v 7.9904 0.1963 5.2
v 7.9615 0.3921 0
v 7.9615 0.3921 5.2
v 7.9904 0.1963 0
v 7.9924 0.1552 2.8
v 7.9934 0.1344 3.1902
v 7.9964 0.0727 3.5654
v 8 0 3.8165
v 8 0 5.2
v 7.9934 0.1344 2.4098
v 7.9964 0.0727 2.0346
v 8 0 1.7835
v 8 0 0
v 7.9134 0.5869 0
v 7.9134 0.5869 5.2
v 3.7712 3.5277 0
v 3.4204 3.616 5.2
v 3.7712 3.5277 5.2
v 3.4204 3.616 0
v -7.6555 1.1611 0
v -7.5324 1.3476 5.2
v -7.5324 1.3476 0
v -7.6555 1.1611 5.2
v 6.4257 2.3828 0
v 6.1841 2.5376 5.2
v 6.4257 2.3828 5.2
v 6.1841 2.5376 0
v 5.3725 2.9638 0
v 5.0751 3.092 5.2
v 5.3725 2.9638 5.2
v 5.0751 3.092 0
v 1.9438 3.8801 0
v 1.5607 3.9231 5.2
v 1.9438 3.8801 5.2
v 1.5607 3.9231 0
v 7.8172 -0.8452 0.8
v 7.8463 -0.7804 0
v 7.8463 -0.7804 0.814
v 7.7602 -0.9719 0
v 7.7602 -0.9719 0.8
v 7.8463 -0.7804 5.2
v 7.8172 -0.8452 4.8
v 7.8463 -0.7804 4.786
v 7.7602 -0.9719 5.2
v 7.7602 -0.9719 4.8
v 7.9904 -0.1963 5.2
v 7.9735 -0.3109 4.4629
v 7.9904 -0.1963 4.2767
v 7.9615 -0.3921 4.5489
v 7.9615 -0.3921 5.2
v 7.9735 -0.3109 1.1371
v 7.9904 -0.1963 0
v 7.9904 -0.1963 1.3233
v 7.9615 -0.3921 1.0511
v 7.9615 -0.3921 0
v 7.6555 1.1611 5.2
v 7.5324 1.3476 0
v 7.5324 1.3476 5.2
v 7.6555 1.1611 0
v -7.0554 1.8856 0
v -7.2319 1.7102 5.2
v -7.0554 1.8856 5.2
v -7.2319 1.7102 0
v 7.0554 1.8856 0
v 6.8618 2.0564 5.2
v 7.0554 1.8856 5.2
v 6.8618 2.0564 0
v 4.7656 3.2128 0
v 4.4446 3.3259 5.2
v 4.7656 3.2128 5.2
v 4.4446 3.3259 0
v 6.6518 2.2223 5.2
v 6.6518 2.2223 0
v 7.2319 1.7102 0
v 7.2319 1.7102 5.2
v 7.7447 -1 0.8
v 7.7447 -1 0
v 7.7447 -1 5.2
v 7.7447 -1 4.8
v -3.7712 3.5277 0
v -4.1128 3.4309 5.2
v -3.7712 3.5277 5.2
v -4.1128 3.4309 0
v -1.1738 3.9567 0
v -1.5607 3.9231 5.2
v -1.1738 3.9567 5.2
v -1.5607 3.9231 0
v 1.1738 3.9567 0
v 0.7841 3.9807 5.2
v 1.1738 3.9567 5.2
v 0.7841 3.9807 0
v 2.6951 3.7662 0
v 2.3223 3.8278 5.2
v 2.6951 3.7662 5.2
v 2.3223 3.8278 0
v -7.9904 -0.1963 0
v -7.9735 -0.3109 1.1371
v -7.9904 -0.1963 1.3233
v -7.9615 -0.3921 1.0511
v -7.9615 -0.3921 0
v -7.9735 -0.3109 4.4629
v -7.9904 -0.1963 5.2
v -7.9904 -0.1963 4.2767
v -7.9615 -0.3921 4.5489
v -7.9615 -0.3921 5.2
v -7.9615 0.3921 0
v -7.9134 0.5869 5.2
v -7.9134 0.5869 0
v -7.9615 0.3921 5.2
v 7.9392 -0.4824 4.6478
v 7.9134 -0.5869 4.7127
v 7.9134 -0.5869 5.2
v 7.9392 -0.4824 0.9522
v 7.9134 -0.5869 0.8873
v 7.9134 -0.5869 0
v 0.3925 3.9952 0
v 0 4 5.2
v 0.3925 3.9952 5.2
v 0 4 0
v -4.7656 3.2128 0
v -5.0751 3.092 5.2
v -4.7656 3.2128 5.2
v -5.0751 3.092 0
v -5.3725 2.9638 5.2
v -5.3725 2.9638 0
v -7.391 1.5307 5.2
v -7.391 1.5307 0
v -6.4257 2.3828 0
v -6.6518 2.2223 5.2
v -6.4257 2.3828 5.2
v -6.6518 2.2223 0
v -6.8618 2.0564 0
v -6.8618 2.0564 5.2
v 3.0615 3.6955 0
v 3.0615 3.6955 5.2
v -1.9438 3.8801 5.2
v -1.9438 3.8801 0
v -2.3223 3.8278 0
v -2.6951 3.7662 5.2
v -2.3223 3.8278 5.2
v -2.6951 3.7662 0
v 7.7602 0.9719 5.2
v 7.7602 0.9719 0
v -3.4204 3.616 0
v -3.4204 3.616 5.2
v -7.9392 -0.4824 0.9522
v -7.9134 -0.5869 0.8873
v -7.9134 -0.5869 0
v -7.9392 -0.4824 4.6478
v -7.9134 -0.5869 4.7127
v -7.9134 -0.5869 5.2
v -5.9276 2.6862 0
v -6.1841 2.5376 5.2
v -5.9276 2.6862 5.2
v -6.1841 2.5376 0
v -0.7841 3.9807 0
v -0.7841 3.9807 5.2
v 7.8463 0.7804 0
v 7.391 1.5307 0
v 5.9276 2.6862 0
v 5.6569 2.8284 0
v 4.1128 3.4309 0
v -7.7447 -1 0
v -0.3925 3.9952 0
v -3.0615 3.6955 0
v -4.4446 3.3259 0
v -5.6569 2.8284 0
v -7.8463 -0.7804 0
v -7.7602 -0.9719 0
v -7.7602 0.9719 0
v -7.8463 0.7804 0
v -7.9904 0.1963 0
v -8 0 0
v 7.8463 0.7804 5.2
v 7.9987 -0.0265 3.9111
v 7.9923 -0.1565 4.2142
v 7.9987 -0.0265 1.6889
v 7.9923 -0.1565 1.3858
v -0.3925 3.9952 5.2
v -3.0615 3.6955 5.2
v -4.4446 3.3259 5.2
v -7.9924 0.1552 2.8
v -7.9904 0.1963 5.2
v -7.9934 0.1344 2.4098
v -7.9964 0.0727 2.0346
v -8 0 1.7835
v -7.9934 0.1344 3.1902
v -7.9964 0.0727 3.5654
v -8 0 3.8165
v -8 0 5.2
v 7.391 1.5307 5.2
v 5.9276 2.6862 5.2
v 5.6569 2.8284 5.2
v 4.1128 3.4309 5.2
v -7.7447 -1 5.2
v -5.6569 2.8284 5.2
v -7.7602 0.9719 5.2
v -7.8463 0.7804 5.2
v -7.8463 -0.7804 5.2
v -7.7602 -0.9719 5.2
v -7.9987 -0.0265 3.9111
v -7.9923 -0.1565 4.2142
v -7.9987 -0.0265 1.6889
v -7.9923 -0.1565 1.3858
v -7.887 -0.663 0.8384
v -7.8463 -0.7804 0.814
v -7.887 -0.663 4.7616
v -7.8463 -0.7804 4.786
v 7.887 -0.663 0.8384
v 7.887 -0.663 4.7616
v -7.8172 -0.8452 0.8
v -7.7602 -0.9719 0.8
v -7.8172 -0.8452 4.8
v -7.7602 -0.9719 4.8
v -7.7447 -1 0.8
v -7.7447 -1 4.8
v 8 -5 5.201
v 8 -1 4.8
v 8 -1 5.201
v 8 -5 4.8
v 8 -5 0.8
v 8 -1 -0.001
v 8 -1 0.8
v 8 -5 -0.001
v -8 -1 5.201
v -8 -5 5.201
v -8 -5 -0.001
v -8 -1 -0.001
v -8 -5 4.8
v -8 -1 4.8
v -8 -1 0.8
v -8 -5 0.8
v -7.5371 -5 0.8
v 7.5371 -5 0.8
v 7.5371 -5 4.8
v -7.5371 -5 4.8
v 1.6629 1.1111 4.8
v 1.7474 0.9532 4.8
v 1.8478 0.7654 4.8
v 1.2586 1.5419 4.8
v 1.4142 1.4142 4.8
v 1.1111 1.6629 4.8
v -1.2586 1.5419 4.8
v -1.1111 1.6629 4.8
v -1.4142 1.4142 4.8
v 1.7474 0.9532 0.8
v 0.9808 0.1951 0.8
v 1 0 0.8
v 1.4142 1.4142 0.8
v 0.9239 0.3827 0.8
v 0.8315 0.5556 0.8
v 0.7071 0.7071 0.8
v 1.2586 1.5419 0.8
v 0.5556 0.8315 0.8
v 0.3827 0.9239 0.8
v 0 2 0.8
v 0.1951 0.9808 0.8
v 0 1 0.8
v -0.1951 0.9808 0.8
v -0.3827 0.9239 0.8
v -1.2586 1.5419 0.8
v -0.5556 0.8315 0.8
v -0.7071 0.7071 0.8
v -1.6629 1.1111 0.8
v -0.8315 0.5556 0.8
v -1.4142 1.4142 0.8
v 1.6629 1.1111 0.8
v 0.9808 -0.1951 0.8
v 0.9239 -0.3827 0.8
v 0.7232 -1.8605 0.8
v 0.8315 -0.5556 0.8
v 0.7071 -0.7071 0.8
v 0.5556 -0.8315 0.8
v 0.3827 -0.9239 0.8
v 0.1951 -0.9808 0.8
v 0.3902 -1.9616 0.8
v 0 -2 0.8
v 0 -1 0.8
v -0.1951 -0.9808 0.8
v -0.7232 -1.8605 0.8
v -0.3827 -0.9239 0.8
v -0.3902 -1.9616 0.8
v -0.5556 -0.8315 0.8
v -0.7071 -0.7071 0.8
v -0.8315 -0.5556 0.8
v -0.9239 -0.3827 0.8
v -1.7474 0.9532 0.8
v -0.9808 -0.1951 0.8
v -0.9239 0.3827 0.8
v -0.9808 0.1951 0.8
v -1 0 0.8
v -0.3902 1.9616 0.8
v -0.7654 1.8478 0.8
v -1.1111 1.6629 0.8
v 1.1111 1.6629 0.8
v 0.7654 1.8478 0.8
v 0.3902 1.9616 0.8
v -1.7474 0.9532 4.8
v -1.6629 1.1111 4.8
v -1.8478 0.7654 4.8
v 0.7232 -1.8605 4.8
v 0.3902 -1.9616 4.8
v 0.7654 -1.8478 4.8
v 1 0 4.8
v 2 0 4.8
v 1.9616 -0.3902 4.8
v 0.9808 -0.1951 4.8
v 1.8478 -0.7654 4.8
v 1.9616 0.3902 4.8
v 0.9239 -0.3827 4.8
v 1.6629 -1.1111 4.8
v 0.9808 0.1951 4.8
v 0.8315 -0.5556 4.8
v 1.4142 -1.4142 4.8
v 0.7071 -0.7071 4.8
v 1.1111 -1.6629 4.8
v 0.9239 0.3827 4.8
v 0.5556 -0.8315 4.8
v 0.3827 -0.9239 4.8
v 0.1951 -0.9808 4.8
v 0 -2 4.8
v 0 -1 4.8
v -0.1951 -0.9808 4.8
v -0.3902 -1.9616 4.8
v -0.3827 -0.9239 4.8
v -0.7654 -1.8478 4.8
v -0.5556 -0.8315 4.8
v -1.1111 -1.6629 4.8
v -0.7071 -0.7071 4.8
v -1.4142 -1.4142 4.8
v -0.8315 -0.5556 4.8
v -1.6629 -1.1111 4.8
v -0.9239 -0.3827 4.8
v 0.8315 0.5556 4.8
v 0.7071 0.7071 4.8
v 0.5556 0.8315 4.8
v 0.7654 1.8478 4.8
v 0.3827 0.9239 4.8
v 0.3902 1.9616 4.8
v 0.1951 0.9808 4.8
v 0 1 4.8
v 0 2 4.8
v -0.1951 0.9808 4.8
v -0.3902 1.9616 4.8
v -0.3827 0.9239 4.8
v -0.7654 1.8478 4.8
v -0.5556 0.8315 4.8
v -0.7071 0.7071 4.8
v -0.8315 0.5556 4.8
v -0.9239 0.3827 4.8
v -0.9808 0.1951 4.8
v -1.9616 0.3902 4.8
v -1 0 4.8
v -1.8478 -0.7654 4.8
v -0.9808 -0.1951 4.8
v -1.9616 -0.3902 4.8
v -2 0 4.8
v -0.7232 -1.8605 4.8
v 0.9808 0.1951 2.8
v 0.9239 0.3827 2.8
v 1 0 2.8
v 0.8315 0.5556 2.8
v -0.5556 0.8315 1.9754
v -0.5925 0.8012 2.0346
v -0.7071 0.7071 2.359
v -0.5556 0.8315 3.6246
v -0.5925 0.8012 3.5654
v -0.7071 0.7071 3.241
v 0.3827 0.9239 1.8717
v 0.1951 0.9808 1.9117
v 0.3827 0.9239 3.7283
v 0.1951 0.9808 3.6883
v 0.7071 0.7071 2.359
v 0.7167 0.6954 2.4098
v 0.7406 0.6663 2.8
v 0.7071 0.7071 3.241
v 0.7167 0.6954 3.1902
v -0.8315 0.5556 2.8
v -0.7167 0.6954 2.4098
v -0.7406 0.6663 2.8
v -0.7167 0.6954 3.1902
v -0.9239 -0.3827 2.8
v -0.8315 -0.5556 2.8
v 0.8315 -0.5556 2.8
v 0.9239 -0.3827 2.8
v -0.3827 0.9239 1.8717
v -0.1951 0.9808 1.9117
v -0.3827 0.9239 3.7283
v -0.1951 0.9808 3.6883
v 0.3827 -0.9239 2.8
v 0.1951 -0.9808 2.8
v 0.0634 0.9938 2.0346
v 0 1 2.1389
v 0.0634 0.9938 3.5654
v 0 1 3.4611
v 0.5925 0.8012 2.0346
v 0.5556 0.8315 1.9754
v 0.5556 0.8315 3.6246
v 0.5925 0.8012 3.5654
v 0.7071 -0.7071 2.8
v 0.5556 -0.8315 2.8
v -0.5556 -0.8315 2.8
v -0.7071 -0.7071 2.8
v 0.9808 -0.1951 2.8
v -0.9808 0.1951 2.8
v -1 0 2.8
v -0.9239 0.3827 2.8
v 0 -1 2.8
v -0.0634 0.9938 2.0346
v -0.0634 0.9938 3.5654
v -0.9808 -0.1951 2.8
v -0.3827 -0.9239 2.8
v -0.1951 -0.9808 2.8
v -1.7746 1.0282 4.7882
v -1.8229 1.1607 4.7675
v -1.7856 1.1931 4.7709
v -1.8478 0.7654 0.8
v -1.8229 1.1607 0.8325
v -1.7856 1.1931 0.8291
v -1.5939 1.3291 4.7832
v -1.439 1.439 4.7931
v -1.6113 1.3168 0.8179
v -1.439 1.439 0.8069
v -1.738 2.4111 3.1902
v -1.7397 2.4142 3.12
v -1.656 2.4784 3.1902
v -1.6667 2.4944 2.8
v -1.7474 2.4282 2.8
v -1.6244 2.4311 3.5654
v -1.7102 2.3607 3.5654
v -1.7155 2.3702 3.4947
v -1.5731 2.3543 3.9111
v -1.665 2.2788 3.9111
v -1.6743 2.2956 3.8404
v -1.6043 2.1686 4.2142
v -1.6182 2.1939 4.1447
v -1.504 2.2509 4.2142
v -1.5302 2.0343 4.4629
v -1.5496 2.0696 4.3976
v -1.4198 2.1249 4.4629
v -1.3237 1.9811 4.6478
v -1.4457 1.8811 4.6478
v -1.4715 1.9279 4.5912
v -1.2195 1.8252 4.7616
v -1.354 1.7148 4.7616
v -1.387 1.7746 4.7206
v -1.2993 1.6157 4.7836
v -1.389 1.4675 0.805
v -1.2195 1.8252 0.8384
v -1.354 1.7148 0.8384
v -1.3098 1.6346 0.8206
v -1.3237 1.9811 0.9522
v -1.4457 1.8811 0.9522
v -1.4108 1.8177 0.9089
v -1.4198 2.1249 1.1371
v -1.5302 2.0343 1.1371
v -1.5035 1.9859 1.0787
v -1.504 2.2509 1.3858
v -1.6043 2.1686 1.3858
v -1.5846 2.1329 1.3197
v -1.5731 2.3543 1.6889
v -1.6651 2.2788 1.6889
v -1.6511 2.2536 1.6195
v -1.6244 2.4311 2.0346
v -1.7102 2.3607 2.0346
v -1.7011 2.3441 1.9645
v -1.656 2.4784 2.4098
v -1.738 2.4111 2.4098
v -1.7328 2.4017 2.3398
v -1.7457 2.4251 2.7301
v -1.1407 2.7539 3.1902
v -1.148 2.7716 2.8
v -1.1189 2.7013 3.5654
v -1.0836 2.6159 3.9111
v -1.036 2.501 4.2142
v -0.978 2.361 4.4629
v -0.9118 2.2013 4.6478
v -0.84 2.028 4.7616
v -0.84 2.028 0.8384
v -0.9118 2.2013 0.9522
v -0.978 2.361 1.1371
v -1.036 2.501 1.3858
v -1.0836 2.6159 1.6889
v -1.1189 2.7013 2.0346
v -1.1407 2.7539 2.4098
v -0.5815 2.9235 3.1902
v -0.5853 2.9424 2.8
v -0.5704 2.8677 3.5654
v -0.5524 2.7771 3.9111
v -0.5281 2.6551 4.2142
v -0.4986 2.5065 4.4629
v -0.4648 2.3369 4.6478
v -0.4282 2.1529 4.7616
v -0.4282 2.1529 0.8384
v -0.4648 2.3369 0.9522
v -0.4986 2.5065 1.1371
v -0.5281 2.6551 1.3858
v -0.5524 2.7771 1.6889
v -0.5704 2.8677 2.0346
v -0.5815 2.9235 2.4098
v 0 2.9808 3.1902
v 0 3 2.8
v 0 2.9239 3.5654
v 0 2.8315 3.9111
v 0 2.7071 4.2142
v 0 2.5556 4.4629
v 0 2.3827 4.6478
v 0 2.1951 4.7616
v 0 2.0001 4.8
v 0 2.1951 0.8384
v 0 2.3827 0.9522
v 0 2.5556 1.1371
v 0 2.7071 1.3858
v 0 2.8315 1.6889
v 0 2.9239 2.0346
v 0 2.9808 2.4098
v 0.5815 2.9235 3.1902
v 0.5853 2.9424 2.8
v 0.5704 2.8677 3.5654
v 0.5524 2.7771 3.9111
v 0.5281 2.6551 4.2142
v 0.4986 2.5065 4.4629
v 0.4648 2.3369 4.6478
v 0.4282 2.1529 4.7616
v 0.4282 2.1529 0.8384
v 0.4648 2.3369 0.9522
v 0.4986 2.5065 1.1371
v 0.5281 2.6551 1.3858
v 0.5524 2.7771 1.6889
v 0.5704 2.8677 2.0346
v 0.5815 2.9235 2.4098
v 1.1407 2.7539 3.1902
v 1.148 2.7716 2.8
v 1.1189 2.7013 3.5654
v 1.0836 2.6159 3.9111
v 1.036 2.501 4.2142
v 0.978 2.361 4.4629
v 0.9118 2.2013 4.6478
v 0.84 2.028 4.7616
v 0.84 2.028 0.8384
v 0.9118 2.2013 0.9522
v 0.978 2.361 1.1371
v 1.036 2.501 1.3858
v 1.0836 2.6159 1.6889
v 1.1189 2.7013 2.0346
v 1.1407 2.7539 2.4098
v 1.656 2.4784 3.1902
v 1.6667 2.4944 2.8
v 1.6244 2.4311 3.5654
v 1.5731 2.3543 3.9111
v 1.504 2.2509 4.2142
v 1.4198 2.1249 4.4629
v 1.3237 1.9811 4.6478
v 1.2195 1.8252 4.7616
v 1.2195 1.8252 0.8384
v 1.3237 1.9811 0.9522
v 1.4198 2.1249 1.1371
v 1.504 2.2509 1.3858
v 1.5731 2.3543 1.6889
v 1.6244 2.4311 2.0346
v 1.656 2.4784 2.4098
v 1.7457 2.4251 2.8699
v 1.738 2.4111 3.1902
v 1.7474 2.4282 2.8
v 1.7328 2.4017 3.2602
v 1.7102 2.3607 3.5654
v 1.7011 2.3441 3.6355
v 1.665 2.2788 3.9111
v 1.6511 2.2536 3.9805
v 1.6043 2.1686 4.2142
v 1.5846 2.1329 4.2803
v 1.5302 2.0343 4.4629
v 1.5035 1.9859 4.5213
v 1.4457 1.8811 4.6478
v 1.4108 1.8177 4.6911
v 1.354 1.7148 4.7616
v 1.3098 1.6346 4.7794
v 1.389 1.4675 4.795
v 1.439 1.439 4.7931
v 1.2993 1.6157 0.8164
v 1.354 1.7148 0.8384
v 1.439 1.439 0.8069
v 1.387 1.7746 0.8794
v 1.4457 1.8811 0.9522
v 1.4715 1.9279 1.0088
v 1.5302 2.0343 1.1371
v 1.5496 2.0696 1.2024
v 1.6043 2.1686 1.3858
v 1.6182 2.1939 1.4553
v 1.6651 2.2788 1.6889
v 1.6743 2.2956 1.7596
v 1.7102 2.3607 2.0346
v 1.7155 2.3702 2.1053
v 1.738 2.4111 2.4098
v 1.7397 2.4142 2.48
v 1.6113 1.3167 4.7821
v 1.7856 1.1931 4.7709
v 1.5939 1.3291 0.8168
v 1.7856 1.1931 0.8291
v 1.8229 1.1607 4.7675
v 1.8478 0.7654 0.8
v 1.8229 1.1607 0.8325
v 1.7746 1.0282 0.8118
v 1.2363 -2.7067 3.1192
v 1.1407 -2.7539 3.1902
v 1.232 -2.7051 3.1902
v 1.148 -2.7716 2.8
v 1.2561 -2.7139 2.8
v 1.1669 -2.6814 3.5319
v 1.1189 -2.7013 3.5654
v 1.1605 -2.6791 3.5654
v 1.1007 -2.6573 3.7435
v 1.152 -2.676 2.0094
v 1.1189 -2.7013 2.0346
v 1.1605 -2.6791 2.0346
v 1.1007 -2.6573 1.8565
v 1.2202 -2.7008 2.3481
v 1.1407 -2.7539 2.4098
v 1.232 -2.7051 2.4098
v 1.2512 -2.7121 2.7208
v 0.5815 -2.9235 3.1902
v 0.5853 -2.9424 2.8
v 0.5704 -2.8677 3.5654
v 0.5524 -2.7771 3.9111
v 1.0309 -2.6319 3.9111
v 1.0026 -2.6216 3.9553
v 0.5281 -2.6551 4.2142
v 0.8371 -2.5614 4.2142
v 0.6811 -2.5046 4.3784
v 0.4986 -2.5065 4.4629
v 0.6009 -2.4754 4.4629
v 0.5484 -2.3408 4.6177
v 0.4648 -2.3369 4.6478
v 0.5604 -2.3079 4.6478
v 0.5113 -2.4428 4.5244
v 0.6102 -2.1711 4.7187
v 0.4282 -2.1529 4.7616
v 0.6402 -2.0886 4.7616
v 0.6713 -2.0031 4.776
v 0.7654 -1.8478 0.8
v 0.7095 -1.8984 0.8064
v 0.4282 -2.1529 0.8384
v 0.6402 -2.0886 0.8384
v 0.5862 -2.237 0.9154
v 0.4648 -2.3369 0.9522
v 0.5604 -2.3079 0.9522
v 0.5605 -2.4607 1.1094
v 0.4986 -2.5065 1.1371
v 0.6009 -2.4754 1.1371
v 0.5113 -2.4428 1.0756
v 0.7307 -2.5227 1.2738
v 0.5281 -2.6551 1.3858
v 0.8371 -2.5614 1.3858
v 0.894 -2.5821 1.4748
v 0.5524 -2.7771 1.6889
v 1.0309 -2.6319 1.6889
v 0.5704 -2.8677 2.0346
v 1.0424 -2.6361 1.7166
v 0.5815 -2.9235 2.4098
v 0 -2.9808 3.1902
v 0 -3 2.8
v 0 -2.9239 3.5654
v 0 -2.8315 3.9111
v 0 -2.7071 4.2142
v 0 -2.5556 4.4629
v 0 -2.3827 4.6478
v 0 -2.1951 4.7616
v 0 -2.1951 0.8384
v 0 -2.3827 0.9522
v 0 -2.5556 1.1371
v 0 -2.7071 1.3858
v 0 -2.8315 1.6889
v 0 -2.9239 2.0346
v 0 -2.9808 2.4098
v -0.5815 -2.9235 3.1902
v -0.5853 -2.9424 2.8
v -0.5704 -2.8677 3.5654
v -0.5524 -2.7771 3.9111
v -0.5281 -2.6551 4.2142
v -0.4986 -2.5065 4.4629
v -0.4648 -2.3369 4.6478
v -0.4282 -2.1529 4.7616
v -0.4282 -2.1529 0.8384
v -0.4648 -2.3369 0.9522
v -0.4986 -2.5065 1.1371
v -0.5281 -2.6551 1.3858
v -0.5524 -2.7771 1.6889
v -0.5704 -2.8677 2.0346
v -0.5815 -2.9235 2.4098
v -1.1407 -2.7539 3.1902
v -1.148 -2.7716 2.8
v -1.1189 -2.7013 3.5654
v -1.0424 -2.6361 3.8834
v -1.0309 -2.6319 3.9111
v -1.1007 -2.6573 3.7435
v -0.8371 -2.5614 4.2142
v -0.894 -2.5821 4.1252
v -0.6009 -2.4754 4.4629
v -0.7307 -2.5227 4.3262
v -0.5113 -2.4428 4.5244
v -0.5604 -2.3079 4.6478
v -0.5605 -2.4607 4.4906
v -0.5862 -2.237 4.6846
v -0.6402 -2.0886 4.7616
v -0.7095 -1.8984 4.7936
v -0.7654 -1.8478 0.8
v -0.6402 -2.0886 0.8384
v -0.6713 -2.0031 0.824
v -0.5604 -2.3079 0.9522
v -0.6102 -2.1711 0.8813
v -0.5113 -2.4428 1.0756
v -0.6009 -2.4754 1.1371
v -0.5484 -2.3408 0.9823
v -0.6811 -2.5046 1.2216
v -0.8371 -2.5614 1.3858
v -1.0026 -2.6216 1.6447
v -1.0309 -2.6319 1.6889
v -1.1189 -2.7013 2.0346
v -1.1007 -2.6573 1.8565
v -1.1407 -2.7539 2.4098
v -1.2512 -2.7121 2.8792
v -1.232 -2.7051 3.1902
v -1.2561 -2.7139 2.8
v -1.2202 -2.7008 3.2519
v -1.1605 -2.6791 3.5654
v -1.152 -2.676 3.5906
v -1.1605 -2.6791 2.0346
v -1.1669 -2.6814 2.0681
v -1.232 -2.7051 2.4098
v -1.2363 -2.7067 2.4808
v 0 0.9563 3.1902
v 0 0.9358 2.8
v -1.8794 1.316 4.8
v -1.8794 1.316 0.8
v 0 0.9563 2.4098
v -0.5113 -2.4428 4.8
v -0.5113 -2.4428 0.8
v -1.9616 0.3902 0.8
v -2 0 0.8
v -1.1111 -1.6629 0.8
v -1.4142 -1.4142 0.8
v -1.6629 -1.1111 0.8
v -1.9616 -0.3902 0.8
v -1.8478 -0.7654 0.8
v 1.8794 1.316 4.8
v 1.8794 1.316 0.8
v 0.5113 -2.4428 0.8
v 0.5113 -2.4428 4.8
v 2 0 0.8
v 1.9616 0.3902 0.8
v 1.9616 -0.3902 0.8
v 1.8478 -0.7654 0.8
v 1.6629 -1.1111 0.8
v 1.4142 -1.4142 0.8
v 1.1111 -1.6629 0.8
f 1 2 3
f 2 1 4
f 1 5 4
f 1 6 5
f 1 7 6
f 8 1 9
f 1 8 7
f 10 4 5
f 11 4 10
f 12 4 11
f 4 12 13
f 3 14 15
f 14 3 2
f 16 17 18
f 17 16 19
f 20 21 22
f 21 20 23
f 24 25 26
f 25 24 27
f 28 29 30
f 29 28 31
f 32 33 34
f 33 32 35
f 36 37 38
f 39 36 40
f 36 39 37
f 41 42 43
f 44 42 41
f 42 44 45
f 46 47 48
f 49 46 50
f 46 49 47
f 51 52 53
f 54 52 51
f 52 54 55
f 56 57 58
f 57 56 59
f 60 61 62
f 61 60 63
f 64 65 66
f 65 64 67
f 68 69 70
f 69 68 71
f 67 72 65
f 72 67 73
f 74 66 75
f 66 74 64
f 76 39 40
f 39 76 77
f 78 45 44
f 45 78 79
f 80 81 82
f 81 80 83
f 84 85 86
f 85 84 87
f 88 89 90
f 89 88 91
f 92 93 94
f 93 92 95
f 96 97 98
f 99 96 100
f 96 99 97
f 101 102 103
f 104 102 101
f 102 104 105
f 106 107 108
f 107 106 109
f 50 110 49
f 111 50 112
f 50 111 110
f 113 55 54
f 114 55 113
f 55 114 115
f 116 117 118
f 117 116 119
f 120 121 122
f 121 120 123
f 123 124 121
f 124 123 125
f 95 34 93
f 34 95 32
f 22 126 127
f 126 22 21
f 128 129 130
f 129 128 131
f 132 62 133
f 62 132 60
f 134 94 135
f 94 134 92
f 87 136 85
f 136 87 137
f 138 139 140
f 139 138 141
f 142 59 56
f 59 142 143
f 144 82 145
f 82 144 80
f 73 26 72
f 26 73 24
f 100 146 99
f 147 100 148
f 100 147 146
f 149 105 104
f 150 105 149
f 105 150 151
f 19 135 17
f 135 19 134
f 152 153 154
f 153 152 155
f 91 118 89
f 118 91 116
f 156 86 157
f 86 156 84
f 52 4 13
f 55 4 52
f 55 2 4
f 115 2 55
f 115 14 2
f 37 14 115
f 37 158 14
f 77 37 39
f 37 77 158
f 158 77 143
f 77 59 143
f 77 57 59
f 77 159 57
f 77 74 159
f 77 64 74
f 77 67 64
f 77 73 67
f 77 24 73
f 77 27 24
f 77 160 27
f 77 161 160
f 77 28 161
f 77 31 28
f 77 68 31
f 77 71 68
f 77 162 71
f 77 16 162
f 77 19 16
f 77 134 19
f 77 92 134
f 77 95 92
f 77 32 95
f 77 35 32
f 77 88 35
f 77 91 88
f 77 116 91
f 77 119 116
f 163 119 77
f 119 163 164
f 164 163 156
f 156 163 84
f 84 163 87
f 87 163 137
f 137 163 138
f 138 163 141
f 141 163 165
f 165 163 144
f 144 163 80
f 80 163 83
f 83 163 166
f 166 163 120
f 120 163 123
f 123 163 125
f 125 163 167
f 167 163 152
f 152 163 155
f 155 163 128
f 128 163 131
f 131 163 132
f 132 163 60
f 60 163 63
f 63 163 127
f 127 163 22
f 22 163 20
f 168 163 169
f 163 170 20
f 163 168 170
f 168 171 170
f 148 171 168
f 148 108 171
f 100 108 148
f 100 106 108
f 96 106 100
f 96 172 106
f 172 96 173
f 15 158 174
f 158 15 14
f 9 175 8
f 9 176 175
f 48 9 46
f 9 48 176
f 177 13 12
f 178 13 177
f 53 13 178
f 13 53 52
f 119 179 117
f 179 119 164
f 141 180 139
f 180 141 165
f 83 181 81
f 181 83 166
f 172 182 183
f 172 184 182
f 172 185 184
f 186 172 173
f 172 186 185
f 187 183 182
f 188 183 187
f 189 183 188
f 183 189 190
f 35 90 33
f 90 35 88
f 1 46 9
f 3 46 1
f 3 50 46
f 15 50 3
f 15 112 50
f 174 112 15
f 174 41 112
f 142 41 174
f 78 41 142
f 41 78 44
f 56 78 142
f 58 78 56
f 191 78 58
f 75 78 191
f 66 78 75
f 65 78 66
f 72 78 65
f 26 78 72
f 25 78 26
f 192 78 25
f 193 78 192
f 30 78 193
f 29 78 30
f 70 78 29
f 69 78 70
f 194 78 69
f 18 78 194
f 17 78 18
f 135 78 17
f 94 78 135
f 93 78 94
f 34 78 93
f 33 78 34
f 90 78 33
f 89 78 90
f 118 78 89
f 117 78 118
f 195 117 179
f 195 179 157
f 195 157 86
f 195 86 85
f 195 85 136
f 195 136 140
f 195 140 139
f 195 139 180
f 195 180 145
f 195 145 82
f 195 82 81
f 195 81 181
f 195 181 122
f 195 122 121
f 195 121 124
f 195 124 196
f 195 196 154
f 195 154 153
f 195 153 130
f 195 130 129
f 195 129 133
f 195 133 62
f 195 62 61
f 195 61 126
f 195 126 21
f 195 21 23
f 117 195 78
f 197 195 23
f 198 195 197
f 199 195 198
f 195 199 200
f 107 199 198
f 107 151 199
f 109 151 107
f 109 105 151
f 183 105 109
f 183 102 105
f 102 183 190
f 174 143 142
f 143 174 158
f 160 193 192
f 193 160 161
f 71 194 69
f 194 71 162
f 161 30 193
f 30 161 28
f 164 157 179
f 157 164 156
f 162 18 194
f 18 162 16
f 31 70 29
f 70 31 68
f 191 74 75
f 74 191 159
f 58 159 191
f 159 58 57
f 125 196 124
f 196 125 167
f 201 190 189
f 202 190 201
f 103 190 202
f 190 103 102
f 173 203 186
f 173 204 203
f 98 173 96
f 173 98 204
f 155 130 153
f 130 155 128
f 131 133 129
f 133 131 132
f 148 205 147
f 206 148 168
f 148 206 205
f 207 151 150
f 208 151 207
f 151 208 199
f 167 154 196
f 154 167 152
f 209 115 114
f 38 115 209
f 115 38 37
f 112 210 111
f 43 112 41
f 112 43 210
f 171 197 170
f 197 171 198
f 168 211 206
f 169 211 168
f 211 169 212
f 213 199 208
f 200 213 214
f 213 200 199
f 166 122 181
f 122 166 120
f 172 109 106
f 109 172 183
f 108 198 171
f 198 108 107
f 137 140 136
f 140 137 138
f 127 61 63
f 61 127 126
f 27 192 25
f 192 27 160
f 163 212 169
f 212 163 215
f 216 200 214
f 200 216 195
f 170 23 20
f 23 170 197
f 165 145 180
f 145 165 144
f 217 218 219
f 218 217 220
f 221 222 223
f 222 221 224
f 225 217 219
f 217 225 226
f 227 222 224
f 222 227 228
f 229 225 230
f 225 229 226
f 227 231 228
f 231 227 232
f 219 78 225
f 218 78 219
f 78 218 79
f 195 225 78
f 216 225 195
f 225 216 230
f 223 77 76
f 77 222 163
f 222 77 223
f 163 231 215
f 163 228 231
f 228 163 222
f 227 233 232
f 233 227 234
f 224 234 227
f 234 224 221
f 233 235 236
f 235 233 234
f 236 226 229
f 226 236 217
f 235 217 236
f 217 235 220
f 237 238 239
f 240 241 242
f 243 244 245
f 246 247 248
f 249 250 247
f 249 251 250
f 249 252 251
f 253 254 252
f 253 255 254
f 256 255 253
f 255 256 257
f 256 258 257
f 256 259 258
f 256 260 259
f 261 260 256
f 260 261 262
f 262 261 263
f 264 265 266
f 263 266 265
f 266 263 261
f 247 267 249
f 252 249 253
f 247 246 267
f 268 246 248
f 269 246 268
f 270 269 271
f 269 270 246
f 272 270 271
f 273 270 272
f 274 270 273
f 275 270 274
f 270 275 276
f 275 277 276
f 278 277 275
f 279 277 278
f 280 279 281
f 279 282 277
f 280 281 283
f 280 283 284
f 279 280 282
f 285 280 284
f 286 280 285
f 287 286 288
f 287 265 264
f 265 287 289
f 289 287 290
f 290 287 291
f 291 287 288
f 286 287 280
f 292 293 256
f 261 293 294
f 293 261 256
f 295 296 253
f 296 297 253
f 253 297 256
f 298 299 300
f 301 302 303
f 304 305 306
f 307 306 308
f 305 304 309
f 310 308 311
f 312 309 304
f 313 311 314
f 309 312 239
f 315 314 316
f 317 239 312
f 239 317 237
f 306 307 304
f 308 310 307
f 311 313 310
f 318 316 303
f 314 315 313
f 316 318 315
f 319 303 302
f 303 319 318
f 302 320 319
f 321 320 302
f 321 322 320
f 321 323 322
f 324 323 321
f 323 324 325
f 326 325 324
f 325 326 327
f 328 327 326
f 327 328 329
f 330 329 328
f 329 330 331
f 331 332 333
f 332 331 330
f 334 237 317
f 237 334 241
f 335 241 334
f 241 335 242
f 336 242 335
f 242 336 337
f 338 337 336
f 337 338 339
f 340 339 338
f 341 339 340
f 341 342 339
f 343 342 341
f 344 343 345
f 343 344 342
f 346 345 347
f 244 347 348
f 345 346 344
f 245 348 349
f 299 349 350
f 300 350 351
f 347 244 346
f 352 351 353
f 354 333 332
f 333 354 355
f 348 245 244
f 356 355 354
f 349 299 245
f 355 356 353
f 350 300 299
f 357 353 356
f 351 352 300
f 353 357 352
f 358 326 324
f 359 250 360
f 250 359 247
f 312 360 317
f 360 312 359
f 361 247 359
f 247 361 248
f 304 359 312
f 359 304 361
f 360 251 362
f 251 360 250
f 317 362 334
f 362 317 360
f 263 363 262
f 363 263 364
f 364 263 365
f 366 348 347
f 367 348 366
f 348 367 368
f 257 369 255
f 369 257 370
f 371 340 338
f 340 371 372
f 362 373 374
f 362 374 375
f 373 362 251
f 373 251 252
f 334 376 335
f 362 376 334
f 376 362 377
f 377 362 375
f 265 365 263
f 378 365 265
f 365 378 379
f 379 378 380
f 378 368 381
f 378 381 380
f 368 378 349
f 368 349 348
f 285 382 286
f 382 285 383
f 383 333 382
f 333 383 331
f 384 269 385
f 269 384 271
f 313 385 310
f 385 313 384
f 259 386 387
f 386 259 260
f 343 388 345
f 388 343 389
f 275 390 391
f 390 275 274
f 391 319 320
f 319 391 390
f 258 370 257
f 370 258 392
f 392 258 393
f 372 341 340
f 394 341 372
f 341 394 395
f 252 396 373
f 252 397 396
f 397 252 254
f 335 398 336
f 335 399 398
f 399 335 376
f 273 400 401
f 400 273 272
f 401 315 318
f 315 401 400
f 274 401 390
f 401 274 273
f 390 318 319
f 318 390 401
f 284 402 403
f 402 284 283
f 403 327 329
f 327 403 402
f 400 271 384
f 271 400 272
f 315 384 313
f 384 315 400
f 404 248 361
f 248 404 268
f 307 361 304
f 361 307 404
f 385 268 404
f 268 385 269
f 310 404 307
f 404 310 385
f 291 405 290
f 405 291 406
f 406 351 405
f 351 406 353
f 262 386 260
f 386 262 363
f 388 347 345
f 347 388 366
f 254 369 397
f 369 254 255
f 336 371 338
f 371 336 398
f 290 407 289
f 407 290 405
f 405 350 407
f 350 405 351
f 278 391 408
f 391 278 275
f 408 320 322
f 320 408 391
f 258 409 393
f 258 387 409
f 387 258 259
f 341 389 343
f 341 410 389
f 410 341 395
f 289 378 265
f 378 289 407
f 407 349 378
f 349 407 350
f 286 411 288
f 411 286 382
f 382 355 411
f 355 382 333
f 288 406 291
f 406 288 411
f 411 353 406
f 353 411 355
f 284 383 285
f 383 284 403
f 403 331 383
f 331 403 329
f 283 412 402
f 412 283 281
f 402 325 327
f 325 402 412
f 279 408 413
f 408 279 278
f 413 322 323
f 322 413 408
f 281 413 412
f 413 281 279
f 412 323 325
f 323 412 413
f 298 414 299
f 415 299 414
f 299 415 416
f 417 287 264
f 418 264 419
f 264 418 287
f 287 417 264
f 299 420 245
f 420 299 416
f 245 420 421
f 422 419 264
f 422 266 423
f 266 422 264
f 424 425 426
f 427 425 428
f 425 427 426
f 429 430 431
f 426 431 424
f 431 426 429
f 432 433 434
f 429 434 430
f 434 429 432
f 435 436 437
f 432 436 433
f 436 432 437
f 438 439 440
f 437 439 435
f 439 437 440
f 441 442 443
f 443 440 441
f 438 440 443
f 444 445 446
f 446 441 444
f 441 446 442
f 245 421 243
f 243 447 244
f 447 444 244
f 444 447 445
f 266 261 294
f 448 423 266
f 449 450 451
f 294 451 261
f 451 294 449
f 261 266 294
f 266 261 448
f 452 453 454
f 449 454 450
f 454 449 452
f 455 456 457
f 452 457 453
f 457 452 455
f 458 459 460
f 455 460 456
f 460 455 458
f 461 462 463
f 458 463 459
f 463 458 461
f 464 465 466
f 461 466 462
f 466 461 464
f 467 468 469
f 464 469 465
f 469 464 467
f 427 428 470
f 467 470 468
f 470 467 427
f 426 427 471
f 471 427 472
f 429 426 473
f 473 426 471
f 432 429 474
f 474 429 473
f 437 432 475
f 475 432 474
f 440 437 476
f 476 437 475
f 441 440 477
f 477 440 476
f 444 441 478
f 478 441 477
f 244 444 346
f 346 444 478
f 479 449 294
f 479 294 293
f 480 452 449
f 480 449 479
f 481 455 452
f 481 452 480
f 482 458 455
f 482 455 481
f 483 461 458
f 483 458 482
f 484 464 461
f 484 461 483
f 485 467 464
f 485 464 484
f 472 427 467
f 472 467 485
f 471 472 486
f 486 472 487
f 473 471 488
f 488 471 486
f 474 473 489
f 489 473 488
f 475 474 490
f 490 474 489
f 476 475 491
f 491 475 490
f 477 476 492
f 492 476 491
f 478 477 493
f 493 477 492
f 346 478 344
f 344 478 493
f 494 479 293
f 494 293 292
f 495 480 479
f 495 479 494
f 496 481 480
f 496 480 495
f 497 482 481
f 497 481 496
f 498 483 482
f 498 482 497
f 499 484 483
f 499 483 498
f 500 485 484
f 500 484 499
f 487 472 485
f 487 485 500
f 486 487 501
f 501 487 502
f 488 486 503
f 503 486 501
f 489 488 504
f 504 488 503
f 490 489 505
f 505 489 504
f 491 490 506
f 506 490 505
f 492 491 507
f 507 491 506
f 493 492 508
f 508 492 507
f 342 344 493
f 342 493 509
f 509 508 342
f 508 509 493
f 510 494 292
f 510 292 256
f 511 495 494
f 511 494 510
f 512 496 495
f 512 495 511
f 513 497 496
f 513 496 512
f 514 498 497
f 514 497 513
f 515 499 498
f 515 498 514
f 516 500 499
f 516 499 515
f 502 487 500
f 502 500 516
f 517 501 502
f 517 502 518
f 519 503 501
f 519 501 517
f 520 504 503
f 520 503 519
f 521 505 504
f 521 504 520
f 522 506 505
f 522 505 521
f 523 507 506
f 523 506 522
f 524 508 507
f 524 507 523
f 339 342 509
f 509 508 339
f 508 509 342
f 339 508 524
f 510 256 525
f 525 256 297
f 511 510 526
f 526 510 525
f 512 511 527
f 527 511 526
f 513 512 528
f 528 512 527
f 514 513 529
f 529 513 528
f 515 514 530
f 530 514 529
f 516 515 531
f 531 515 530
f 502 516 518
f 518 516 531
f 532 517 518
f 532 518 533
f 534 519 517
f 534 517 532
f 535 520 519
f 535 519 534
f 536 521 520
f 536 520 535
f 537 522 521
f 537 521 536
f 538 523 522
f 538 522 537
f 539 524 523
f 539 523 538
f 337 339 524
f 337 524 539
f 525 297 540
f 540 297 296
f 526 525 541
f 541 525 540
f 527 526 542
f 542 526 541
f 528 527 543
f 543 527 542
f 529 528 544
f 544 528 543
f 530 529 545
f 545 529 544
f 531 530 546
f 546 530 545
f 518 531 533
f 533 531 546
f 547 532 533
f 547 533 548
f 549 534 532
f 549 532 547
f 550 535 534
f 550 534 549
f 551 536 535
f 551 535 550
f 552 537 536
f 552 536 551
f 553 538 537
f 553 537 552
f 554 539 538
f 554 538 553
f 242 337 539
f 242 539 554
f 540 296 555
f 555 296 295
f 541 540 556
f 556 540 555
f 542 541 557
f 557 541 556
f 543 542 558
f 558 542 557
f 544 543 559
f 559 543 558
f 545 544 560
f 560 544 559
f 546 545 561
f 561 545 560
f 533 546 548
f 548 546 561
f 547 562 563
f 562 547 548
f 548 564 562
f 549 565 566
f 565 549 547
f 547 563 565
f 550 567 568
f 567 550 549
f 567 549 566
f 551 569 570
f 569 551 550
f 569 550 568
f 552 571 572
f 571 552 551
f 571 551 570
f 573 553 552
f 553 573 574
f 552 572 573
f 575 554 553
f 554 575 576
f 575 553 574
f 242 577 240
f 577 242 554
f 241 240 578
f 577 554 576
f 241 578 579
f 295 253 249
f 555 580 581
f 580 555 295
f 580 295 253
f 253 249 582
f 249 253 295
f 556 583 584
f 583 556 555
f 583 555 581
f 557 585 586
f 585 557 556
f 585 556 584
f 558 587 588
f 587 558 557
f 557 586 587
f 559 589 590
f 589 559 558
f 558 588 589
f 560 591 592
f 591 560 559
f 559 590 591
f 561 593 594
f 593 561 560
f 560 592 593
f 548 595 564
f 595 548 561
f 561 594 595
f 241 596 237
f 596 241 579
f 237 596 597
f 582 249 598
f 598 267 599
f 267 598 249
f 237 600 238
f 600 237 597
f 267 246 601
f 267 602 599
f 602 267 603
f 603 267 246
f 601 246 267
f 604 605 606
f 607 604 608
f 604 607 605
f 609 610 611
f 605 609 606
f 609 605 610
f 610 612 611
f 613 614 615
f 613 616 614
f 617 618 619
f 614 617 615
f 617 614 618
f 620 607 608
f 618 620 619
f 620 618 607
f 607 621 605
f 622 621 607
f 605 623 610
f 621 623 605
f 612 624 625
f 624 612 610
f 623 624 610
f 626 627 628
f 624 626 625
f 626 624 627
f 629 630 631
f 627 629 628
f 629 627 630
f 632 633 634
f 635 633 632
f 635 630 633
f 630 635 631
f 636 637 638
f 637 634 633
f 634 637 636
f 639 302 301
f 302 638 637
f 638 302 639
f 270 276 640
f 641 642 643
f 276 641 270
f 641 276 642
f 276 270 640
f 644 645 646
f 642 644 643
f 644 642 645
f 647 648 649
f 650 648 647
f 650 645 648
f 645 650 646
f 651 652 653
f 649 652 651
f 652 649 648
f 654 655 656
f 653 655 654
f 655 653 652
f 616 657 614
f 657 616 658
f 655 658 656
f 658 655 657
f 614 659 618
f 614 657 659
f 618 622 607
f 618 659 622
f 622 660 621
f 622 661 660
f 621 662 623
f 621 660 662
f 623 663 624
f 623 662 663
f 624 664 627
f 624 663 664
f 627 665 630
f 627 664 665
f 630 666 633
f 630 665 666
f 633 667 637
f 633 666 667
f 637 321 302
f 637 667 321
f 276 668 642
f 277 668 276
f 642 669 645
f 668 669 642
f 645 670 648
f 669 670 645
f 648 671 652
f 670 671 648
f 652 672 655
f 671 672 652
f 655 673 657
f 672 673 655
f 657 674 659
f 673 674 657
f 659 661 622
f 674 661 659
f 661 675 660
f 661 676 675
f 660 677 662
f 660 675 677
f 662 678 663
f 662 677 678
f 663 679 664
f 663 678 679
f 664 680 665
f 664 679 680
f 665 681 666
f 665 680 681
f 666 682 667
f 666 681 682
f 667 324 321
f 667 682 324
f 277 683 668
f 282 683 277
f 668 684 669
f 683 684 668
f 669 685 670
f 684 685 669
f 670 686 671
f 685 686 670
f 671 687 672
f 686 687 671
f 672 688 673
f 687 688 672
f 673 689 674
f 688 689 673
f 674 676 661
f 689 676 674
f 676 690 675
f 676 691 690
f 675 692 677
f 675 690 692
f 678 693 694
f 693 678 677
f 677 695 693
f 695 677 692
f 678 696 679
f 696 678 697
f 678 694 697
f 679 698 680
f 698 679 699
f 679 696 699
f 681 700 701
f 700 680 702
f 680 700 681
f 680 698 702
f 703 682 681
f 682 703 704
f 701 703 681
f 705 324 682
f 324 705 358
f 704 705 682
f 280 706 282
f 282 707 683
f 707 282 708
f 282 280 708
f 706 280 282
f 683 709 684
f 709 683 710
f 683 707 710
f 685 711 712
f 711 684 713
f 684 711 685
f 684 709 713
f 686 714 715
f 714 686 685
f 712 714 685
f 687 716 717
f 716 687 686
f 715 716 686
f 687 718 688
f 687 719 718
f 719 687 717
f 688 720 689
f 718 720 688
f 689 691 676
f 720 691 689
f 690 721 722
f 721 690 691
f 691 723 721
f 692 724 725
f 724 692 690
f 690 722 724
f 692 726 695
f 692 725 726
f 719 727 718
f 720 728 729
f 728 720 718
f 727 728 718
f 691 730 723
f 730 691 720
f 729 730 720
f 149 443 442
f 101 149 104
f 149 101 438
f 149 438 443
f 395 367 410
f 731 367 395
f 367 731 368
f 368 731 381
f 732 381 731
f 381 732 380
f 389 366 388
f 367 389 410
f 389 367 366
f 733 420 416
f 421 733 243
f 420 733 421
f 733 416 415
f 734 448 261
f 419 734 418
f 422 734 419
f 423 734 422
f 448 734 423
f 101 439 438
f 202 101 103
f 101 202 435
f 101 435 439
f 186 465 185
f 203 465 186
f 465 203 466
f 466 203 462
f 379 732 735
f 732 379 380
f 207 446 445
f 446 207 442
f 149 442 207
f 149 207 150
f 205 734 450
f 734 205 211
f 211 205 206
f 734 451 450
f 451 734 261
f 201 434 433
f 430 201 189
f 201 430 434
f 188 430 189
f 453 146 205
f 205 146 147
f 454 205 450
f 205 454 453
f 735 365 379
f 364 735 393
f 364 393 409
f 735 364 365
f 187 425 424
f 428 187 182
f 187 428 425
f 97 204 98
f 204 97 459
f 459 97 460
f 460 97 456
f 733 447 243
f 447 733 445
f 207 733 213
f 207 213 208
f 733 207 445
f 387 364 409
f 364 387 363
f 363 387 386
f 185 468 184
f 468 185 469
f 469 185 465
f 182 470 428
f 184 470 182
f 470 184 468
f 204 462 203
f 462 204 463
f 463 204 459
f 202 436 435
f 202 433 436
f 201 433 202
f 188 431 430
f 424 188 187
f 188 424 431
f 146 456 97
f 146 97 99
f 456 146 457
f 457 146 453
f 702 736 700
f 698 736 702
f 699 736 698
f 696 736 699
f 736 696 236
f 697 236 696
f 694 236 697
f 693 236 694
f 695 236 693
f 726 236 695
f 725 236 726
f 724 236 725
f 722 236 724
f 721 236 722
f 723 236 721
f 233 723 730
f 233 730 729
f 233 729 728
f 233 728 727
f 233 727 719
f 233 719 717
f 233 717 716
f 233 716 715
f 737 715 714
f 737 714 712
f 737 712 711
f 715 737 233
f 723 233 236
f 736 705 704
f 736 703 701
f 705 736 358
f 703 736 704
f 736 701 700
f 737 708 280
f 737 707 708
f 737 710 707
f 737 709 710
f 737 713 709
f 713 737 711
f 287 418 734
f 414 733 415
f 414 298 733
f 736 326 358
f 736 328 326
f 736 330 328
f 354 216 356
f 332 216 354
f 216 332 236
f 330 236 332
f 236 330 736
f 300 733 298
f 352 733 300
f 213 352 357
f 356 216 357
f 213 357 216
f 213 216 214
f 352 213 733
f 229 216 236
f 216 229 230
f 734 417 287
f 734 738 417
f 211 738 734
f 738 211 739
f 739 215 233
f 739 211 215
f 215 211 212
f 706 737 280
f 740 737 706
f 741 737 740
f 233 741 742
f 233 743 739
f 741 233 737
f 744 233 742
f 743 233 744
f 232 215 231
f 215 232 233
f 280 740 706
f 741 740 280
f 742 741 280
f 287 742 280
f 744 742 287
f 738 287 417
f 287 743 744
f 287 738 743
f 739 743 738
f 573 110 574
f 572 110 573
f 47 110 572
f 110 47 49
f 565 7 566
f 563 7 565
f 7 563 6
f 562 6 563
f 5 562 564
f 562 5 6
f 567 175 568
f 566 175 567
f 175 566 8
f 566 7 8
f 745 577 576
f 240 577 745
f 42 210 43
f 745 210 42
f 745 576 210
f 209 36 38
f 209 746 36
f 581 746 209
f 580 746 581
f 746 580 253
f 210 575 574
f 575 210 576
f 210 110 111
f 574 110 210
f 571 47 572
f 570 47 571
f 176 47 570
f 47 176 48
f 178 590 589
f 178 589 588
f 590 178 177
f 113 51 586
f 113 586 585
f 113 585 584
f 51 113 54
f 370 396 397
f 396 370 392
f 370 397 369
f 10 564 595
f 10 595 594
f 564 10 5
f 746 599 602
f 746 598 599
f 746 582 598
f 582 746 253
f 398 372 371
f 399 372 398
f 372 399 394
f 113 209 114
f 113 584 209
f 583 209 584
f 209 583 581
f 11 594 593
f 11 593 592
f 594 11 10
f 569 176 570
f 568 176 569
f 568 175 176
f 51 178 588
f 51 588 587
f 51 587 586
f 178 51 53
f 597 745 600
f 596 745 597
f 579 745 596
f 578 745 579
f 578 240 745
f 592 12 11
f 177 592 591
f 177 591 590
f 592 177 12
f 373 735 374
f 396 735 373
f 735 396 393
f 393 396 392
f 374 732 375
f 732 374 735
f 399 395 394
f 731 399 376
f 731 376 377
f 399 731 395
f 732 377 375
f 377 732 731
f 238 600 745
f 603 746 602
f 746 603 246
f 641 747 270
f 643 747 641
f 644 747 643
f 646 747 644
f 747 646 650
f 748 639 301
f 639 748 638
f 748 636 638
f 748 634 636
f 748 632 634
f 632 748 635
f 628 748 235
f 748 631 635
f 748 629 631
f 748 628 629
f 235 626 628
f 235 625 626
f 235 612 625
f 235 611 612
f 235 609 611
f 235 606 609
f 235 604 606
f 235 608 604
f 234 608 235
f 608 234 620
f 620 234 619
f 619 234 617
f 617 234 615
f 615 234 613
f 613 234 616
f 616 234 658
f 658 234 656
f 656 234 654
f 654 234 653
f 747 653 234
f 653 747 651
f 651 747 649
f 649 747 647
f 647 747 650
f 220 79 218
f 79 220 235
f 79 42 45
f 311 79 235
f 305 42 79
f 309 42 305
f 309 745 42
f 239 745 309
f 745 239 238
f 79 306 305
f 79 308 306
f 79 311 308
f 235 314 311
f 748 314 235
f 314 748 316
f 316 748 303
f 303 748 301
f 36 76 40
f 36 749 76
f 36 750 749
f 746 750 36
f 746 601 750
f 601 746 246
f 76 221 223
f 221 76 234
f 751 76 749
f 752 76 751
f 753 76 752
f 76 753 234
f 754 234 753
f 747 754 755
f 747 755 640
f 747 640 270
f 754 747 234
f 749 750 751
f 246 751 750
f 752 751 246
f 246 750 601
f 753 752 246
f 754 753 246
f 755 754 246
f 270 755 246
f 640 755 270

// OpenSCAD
EPSILON = 0.001;

WALL_THICKNESS = 0.4;

module Lanyard_holder(baseThickness = 0.8, positiveShape = true) {
    height = 4;
    clearanceCircleScaleX = 1/2;
    cylinderDiameter = 2;
    
    // Wrapping base
    if (positiveShape) {
        difference() {
            height = height + baseThickness + WALL_THICKNESS;
            diameter = 2 * height * clearanceCircleScaleX + cylinderDiameter + 2 * WALL_THICKNESS;
            scale([2, 1]) {
                cylinder(h = height,
                         d = diameter,
                         $fn = 128);
                translate([-diameter / 2, -diameter / 2 - cylinderDiameter / 2, -EPSILON])
                    cube([diameter, diameter / 2, height + 2 * EPSILON]);
            }
        }
    }
    
    // Holder cylinder
    if (positiveShape) {
        cylinder(h = height + baseThickness + 2 * EPSILON, d = cylinderDiameter, $fn=32);
    }
    
    // Clearance around the cylinder
    if (!positiveShape) {
        translate([0, 0, baseThickness + height / 2]) {
            rotate_extrude(convexity = 10, $fn=32)
                translate([(height * clearanceCircleScaleX) / 2 + cylinderDiameter / 2, 0])
                    scale([clearanceCircleScaleX, 1])
                        circle(d = height, $fn = 32);
        }
        translate([0, 0, baseThickness])
            difference() {
                cylinder(d = height * clearanceCircleScaleX + cylinderDiameter,
                          h = height, $fn = 32);
                translate([0, 0, -EPSILON])
                    cylinder(d = cylinderDiameter, h = height + 2 * EPSILON, $fn = 32);
            }
    }
    
    // Clearance on the side of the cylinder
    if (!positiveShape) {
        for (angle = [-70, 70])
            translate([0,
                       (cylinderDiameter + height * clearanceCircleScaleX) / 2,
                       baseThickness + height / 2])
                rotate([90, 0, angle])
                    scale([clearanceCircleScaleX, 1]) {
                        cylinder(d = height, h = 10, $fn=32);
                        translate([angle > 0 ? -height * 2 : 0, -height / 2, height / 2])
                            cube([height * 2, height, 10]);
                    }
    }
}

difference() {
    Lanyard_holder(0.8, true);
    Lanyard_holder(0.8, false);
}
